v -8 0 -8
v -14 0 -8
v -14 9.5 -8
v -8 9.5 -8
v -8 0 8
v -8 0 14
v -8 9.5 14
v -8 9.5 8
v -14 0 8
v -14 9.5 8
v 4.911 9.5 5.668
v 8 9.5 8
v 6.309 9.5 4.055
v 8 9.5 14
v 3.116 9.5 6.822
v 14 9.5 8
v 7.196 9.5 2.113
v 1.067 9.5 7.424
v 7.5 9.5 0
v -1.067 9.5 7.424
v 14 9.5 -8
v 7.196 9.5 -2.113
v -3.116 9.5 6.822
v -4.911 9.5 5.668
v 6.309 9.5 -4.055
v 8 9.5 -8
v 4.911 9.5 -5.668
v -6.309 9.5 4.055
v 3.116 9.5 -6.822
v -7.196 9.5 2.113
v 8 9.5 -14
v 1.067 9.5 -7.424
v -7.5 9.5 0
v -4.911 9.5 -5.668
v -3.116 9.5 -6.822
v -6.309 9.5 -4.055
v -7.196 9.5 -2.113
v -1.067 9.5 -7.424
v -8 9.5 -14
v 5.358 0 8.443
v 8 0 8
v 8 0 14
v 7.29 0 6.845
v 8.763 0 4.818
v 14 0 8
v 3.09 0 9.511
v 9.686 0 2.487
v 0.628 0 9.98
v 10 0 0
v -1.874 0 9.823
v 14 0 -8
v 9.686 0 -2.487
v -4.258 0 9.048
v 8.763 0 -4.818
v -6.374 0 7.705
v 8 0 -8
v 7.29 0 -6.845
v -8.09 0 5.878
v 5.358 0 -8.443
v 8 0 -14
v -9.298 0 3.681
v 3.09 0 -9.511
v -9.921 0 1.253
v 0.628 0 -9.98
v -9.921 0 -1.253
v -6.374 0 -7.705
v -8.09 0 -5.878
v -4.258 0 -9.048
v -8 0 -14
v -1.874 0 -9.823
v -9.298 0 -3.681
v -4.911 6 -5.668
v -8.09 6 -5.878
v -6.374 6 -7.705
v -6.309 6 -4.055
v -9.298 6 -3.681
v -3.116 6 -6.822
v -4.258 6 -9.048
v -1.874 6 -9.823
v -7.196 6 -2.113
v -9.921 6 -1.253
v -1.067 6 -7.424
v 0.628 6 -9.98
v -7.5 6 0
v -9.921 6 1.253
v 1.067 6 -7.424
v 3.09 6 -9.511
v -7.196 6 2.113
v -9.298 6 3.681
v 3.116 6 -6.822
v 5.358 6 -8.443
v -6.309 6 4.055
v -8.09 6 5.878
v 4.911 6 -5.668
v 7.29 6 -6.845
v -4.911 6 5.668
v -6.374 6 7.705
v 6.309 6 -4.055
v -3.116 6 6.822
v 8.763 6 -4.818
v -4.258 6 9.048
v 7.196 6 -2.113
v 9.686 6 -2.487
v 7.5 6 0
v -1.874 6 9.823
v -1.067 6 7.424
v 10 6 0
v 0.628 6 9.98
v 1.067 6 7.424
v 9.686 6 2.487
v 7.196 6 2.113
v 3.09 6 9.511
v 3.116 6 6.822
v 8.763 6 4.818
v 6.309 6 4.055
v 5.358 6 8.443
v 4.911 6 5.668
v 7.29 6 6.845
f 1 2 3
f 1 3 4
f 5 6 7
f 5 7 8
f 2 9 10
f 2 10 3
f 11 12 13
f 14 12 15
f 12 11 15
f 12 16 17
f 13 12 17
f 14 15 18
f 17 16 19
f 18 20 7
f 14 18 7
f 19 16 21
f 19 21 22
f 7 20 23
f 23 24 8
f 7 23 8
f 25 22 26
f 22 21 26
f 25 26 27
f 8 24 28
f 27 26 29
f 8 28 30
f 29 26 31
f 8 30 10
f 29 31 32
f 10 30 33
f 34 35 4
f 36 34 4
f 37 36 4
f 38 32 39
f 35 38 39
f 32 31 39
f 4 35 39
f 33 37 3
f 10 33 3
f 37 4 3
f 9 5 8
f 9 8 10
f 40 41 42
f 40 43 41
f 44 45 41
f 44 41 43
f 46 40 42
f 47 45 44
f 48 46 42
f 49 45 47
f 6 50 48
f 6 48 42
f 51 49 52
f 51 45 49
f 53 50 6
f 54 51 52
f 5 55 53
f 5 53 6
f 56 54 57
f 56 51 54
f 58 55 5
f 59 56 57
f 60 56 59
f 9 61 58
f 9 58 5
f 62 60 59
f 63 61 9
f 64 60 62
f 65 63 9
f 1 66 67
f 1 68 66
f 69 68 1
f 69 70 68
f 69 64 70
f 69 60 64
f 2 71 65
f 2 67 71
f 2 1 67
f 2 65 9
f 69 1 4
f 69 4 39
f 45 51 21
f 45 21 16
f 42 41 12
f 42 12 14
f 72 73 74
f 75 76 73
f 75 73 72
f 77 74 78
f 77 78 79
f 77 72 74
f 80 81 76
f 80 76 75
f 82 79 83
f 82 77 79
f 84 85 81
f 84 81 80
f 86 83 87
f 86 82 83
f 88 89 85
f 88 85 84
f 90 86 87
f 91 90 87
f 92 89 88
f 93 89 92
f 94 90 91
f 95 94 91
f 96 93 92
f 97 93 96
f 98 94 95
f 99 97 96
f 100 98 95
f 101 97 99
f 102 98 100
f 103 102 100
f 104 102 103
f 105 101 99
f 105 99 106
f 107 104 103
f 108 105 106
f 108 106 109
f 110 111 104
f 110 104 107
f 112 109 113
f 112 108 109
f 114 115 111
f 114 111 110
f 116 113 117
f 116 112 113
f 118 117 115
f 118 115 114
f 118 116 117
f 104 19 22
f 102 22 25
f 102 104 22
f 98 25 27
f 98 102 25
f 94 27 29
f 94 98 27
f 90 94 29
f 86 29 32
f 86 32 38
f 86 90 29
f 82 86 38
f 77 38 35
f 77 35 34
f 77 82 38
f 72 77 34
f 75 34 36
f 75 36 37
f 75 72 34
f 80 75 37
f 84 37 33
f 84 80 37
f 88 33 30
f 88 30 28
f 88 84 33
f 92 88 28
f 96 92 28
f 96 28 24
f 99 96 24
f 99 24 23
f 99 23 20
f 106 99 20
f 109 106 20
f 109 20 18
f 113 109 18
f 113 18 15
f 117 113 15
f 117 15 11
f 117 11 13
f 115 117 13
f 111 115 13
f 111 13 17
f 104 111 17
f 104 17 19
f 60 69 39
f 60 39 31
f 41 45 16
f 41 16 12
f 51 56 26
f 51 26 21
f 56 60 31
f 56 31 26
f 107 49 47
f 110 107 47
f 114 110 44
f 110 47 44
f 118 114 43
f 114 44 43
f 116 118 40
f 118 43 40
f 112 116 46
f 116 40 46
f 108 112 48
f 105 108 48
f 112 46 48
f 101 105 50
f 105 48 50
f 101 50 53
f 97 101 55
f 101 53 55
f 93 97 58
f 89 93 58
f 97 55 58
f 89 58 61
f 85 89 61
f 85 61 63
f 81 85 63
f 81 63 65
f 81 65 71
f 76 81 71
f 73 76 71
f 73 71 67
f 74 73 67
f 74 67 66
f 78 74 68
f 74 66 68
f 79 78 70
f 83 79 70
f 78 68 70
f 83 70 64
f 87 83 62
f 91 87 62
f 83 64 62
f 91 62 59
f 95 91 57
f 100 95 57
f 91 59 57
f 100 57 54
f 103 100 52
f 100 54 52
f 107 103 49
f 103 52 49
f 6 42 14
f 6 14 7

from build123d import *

# Parameters (mm, degrees)
SKETCH_1_R          = 7.5
EXTRUDE_1_DEPTH     = 9.5
SKETCH_2_R          = 10
CUT_EXTRUDE_1_DEPTH = 6


with BuildPart() as part:
    # 草图1 → 凸台-拉伸1 (new body)
    with BuildSketch(Plane(origin=(0, 0, 0), x_dir=(1, 0, 0), z_dir=(0, 1, 0))):
        Polygon((-8, 14), (8, 14), (8, 8), (14, 8), (14, -8), (8, -8), (8, -14), (-8, -14), (-8, -8), (-14, -8), (-14, 8), (-8, 8), align=None)
        Circle(SKETCH_1_R, mode=Mode.SUBTRACT)
    extrude(amount=EXTRUDE_1_DEPTH)

    # 草图2 → 切除-拉伸1 (cut)
    with BuildSketch(Plane.XZ):
        Circle(SKETCH_2_R)
    extrude(amount=-CUT_EXTRUDE_1_DEPTH, mode=Mode.SUBTRACT)


solid = part.part
